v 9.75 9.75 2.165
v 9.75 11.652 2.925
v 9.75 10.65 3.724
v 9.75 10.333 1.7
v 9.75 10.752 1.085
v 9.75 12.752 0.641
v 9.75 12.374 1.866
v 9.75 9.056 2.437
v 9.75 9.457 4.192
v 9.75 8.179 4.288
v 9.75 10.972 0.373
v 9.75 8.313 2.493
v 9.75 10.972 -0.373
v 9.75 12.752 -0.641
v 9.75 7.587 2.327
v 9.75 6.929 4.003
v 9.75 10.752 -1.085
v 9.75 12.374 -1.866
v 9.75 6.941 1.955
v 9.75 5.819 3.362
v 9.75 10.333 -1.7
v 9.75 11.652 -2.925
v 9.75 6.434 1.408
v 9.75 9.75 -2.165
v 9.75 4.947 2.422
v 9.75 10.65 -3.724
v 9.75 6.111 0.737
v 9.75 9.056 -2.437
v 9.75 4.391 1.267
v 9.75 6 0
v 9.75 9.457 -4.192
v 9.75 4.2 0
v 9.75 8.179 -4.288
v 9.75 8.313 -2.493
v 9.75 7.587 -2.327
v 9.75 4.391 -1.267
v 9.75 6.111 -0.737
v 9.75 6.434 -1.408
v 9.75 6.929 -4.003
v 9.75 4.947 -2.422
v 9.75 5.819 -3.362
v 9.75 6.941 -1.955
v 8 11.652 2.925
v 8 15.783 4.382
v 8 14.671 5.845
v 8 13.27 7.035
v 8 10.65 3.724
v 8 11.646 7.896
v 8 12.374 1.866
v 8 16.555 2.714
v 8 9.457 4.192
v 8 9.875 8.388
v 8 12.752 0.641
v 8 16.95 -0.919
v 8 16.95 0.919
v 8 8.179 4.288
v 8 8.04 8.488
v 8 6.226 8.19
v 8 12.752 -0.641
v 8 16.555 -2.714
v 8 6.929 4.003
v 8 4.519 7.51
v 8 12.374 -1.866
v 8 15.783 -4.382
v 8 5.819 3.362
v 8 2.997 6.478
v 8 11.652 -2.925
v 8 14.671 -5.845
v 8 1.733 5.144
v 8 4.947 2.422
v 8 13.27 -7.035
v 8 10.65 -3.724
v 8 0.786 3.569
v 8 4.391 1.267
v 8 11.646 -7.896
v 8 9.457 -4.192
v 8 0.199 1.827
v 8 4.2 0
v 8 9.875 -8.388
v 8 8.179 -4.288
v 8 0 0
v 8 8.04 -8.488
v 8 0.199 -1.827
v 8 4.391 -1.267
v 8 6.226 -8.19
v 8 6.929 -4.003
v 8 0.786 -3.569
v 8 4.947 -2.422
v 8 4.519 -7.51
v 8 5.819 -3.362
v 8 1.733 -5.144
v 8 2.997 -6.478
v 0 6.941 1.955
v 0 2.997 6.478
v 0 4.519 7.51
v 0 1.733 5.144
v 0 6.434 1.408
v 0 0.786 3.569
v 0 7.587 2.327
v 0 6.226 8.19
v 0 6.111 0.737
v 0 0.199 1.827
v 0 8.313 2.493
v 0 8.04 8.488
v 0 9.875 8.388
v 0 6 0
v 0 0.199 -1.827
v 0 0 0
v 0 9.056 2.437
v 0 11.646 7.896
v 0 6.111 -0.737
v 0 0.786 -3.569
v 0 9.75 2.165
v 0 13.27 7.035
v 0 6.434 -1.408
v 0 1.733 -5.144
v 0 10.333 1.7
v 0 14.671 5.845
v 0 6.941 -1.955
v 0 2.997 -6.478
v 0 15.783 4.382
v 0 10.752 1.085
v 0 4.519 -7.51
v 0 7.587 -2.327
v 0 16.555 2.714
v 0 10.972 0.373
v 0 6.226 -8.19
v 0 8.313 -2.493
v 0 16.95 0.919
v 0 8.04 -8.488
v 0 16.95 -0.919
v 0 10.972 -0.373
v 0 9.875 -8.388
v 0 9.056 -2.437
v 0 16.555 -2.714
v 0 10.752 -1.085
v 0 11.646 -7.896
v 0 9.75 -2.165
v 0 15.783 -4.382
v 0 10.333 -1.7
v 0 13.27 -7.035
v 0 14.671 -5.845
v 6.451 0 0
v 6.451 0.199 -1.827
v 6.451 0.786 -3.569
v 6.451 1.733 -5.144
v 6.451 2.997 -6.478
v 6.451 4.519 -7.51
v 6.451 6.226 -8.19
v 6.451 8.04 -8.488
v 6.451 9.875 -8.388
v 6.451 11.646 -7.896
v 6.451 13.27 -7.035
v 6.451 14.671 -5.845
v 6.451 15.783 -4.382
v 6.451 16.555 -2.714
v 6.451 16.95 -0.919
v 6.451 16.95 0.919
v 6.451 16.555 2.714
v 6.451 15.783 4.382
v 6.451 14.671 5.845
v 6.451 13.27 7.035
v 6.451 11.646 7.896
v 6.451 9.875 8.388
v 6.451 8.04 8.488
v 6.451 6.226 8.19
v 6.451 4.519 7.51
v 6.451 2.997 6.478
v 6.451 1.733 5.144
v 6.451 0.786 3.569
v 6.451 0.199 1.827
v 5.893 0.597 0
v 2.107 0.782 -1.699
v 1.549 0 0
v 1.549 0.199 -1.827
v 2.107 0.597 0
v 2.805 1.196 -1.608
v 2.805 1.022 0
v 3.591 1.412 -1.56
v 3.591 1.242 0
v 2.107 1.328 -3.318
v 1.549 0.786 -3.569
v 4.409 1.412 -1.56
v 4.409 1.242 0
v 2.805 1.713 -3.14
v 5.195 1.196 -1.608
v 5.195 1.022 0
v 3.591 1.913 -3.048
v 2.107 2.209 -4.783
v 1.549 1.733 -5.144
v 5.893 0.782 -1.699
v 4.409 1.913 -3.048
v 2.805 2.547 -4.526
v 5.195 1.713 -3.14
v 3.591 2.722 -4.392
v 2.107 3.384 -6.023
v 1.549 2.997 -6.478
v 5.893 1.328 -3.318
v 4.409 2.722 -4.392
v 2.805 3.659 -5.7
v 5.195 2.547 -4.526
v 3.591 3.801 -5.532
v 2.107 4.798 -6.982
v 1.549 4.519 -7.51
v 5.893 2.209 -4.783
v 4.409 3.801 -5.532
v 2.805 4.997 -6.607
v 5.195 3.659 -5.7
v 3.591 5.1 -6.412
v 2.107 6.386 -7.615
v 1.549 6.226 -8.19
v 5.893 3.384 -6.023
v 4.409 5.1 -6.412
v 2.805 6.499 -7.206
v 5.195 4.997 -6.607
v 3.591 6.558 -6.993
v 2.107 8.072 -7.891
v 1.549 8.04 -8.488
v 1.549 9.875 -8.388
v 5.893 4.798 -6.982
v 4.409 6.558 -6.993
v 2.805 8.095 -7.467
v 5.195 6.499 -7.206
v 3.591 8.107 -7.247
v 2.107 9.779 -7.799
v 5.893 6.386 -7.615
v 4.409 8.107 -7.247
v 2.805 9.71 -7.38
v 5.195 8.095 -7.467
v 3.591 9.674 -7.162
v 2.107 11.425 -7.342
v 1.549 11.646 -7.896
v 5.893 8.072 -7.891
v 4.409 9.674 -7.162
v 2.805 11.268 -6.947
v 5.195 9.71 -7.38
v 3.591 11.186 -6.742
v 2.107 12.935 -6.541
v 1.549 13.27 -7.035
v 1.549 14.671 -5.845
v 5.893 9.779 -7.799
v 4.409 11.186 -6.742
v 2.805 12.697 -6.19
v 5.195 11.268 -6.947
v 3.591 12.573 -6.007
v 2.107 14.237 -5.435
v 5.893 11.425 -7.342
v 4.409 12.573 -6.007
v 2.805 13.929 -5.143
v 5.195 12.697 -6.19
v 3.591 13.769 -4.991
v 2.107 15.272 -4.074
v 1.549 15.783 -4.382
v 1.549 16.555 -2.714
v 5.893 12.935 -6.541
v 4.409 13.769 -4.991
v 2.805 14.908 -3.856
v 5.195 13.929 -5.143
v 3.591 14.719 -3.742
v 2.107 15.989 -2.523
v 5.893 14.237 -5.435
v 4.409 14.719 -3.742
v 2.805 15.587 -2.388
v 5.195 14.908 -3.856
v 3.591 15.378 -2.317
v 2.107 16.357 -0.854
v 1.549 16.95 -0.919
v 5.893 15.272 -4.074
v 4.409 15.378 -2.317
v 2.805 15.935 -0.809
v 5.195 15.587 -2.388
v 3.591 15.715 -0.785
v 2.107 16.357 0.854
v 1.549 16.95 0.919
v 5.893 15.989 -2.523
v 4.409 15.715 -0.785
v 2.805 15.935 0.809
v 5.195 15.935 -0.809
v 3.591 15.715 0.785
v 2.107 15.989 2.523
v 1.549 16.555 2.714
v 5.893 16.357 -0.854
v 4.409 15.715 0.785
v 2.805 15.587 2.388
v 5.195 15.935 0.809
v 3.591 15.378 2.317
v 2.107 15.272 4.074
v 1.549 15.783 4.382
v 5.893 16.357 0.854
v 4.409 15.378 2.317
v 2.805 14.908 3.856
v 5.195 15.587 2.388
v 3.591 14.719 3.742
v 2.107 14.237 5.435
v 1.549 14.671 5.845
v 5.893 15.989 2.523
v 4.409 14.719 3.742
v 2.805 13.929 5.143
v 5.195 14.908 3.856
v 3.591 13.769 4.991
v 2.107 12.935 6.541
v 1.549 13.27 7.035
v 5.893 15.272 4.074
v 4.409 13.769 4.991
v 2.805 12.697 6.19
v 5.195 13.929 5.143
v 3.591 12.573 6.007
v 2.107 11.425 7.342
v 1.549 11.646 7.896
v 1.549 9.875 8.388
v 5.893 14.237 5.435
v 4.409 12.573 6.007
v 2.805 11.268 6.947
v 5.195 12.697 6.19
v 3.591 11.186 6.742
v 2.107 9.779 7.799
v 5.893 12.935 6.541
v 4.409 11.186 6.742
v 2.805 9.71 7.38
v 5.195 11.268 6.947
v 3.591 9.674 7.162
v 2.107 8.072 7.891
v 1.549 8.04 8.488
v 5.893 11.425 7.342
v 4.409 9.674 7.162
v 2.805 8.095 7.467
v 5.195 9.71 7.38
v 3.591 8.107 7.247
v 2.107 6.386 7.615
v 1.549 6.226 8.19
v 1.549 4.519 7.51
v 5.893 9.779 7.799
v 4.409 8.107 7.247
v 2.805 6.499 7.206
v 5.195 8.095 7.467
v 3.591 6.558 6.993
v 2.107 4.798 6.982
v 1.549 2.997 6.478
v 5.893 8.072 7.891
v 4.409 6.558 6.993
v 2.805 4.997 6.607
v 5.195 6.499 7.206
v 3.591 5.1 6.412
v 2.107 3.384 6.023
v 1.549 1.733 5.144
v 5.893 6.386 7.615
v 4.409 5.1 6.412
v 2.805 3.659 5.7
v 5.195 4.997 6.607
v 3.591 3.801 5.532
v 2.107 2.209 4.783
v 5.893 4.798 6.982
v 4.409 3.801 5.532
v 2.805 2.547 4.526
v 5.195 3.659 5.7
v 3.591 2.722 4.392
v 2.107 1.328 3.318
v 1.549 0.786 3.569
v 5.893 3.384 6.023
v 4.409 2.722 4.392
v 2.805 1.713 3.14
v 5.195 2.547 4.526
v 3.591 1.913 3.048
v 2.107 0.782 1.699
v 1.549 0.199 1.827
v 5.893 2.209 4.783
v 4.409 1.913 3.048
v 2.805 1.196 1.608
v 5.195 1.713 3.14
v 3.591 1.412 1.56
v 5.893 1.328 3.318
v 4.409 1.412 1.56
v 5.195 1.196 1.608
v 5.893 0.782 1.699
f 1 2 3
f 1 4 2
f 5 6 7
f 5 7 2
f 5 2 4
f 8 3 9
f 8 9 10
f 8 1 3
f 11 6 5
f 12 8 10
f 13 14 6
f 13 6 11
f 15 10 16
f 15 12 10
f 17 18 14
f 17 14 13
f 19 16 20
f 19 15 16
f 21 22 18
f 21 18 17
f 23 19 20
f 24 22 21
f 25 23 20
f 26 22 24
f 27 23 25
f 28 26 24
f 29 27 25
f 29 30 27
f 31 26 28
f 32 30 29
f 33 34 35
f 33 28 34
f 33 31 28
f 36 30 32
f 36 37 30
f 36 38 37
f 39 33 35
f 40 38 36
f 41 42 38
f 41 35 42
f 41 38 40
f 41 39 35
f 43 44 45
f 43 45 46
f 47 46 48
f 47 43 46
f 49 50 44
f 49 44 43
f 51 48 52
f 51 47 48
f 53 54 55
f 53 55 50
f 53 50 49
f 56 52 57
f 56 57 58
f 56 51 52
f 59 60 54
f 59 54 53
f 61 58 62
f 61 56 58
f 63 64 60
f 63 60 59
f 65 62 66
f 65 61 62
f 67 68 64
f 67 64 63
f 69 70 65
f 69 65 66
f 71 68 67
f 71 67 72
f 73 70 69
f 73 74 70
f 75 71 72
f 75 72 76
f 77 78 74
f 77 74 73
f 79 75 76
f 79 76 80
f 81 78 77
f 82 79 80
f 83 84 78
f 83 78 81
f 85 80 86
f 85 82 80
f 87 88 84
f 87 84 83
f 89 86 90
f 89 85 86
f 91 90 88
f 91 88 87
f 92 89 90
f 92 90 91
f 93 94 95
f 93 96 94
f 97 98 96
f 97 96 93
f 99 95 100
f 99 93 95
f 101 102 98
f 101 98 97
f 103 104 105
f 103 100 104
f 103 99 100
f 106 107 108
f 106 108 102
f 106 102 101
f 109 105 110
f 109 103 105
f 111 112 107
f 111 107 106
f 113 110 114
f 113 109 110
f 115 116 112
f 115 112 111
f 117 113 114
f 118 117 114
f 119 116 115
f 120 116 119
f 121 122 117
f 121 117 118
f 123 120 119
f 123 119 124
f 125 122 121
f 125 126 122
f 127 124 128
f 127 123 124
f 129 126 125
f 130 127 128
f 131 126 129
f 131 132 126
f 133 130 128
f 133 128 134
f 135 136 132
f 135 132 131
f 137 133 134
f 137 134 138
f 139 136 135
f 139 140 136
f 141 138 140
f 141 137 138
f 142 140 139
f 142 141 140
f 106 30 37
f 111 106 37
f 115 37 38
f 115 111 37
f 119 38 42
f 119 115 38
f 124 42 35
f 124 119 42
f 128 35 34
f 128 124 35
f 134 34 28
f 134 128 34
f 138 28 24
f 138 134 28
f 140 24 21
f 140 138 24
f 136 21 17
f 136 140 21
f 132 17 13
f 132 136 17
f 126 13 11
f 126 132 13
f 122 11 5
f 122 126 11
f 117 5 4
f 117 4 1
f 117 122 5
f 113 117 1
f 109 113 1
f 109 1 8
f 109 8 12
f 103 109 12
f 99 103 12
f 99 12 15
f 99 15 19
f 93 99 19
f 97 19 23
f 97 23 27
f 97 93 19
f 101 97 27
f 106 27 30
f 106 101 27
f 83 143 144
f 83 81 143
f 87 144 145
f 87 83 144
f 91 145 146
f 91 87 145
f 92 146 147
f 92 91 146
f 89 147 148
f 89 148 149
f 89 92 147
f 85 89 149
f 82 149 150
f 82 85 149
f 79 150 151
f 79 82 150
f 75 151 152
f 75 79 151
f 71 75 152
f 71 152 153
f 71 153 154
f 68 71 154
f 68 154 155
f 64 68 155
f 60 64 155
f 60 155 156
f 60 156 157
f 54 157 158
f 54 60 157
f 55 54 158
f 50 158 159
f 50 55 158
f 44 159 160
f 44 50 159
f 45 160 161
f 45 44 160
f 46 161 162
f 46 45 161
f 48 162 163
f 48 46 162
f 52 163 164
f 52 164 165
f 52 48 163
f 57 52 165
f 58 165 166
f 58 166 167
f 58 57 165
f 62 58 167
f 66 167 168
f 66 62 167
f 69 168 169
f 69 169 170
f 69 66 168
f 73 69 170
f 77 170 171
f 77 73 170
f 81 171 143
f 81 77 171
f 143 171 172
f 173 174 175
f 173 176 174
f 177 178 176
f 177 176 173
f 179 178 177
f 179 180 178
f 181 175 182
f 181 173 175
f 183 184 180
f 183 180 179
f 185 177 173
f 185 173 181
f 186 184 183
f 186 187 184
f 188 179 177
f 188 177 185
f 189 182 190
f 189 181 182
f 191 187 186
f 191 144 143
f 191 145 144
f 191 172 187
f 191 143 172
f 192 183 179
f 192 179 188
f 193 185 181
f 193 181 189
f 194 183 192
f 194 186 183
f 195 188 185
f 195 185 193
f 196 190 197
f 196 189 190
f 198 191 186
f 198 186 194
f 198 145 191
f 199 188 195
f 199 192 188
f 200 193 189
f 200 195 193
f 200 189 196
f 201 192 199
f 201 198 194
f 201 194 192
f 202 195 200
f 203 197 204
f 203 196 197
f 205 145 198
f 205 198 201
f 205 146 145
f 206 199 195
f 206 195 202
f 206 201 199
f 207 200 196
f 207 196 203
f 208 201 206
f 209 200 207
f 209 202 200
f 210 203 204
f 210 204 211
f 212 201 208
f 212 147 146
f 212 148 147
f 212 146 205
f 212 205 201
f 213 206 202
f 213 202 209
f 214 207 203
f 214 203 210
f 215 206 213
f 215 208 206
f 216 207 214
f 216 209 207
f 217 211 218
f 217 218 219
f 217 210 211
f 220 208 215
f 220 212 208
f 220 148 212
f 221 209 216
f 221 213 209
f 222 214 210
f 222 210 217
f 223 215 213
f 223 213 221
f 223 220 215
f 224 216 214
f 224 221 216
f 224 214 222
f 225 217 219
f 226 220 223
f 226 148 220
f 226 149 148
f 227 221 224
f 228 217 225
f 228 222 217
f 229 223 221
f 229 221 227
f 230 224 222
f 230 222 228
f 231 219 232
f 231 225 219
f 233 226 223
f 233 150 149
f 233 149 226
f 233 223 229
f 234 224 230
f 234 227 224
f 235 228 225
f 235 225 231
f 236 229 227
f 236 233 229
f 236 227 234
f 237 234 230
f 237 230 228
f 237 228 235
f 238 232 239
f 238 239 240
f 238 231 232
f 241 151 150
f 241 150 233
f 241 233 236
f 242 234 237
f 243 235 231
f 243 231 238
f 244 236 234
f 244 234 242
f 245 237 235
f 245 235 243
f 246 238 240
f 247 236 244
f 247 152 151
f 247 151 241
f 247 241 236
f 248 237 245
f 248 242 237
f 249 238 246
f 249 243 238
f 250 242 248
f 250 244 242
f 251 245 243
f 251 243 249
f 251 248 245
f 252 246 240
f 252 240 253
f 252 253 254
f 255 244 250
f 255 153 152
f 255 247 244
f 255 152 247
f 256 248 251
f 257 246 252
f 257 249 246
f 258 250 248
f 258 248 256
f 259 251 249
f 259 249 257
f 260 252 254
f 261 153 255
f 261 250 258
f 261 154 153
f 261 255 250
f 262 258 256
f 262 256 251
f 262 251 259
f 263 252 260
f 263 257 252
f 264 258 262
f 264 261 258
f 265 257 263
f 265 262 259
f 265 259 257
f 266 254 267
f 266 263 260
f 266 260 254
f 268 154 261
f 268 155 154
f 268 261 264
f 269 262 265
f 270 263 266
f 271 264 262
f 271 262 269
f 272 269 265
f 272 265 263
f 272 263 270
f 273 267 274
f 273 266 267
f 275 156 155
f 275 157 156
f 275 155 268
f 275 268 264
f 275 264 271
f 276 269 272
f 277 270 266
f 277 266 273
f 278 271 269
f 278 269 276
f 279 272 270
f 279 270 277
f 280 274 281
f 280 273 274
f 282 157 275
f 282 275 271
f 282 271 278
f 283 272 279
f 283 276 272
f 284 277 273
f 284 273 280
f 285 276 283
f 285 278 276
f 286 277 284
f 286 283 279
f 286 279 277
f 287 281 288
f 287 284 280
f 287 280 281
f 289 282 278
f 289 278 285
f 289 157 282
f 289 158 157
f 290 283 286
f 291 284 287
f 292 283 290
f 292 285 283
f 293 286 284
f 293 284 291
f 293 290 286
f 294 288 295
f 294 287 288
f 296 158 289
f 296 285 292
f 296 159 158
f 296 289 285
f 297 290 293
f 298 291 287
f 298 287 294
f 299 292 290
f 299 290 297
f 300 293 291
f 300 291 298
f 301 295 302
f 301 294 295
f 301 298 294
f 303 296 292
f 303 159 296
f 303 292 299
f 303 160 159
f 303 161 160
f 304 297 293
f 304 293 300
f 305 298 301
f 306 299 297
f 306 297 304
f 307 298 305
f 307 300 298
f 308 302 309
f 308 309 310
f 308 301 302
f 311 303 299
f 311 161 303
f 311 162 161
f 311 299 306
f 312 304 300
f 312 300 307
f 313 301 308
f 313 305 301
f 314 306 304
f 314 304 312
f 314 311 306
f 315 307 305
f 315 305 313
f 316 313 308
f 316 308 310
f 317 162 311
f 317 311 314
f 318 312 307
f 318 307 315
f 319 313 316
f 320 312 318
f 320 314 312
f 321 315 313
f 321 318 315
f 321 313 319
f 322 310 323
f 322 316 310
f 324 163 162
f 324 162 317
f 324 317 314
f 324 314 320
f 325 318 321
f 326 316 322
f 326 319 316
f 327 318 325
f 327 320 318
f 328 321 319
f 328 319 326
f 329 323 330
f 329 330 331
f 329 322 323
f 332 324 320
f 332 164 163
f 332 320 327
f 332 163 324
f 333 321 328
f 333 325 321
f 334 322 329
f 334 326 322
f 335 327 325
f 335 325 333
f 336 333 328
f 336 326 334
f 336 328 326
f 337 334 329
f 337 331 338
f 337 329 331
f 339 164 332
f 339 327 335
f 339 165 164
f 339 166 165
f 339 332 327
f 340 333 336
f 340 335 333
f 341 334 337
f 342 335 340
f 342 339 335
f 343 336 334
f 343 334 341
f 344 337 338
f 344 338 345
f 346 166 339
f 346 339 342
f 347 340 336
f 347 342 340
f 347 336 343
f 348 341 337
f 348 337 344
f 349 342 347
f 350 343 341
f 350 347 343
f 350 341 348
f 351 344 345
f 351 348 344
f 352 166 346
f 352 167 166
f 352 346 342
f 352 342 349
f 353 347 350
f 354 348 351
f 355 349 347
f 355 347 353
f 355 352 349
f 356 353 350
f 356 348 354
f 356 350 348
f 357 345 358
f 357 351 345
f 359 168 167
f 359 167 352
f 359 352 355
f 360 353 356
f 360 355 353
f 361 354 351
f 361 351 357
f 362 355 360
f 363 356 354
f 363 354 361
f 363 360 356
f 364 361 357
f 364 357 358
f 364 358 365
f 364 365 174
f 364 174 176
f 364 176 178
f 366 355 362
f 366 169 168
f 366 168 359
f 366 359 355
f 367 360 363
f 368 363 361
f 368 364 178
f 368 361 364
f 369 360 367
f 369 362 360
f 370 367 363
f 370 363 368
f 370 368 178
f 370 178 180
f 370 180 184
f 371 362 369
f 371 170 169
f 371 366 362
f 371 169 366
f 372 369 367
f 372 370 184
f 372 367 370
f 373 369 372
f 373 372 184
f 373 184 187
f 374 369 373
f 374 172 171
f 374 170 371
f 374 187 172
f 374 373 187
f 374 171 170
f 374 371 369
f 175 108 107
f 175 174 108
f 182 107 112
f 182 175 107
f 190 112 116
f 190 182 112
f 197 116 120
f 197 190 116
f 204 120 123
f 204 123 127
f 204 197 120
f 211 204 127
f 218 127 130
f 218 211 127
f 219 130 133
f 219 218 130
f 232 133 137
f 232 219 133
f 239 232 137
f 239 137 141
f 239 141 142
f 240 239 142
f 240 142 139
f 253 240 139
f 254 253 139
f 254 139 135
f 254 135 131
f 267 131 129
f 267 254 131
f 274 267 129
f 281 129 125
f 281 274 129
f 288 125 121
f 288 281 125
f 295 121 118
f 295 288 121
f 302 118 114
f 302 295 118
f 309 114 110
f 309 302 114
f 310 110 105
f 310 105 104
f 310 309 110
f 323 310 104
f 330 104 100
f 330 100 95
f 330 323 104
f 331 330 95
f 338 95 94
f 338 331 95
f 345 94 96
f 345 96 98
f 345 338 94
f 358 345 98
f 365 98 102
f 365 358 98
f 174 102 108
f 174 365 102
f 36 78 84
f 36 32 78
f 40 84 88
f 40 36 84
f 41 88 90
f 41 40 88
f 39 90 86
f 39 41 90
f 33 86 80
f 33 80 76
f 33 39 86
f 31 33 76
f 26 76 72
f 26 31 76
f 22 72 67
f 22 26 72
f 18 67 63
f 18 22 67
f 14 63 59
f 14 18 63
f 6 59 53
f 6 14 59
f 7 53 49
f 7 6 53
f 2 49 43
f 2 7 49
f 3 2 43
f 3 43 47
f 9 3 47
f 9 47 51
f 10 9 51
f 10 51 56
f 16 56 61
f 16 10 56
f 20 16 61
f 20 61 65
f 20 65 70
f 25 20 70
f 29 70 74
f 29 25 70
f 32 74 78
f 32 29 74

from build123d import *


with BuildPart() as f2:
    # F0 (on Top) → F2 (revolve)
    with BuildSketch(Plane.XY):
        with BuildLine():
            Line((0, 6), (0, 0))
            Line((0, 0), (1.549061, 0))
            ThreePointArc((1.549061, 0), (4, 1.27), (6.450939, 0))
            Line((6.450939, 0), (8, 0))
            Line((8, 0), (8, 4.2))
            Line((8, 4.2), (9.75, 4.2))
            Line((9.75, 4.2), (9.75, 6))
            Line((9.75, 6), (0, 6))
        make_face()
    revolve(axis=Axis((10.455161, 8.5, 0), (1, 0, 0)))


solid = f2.part
